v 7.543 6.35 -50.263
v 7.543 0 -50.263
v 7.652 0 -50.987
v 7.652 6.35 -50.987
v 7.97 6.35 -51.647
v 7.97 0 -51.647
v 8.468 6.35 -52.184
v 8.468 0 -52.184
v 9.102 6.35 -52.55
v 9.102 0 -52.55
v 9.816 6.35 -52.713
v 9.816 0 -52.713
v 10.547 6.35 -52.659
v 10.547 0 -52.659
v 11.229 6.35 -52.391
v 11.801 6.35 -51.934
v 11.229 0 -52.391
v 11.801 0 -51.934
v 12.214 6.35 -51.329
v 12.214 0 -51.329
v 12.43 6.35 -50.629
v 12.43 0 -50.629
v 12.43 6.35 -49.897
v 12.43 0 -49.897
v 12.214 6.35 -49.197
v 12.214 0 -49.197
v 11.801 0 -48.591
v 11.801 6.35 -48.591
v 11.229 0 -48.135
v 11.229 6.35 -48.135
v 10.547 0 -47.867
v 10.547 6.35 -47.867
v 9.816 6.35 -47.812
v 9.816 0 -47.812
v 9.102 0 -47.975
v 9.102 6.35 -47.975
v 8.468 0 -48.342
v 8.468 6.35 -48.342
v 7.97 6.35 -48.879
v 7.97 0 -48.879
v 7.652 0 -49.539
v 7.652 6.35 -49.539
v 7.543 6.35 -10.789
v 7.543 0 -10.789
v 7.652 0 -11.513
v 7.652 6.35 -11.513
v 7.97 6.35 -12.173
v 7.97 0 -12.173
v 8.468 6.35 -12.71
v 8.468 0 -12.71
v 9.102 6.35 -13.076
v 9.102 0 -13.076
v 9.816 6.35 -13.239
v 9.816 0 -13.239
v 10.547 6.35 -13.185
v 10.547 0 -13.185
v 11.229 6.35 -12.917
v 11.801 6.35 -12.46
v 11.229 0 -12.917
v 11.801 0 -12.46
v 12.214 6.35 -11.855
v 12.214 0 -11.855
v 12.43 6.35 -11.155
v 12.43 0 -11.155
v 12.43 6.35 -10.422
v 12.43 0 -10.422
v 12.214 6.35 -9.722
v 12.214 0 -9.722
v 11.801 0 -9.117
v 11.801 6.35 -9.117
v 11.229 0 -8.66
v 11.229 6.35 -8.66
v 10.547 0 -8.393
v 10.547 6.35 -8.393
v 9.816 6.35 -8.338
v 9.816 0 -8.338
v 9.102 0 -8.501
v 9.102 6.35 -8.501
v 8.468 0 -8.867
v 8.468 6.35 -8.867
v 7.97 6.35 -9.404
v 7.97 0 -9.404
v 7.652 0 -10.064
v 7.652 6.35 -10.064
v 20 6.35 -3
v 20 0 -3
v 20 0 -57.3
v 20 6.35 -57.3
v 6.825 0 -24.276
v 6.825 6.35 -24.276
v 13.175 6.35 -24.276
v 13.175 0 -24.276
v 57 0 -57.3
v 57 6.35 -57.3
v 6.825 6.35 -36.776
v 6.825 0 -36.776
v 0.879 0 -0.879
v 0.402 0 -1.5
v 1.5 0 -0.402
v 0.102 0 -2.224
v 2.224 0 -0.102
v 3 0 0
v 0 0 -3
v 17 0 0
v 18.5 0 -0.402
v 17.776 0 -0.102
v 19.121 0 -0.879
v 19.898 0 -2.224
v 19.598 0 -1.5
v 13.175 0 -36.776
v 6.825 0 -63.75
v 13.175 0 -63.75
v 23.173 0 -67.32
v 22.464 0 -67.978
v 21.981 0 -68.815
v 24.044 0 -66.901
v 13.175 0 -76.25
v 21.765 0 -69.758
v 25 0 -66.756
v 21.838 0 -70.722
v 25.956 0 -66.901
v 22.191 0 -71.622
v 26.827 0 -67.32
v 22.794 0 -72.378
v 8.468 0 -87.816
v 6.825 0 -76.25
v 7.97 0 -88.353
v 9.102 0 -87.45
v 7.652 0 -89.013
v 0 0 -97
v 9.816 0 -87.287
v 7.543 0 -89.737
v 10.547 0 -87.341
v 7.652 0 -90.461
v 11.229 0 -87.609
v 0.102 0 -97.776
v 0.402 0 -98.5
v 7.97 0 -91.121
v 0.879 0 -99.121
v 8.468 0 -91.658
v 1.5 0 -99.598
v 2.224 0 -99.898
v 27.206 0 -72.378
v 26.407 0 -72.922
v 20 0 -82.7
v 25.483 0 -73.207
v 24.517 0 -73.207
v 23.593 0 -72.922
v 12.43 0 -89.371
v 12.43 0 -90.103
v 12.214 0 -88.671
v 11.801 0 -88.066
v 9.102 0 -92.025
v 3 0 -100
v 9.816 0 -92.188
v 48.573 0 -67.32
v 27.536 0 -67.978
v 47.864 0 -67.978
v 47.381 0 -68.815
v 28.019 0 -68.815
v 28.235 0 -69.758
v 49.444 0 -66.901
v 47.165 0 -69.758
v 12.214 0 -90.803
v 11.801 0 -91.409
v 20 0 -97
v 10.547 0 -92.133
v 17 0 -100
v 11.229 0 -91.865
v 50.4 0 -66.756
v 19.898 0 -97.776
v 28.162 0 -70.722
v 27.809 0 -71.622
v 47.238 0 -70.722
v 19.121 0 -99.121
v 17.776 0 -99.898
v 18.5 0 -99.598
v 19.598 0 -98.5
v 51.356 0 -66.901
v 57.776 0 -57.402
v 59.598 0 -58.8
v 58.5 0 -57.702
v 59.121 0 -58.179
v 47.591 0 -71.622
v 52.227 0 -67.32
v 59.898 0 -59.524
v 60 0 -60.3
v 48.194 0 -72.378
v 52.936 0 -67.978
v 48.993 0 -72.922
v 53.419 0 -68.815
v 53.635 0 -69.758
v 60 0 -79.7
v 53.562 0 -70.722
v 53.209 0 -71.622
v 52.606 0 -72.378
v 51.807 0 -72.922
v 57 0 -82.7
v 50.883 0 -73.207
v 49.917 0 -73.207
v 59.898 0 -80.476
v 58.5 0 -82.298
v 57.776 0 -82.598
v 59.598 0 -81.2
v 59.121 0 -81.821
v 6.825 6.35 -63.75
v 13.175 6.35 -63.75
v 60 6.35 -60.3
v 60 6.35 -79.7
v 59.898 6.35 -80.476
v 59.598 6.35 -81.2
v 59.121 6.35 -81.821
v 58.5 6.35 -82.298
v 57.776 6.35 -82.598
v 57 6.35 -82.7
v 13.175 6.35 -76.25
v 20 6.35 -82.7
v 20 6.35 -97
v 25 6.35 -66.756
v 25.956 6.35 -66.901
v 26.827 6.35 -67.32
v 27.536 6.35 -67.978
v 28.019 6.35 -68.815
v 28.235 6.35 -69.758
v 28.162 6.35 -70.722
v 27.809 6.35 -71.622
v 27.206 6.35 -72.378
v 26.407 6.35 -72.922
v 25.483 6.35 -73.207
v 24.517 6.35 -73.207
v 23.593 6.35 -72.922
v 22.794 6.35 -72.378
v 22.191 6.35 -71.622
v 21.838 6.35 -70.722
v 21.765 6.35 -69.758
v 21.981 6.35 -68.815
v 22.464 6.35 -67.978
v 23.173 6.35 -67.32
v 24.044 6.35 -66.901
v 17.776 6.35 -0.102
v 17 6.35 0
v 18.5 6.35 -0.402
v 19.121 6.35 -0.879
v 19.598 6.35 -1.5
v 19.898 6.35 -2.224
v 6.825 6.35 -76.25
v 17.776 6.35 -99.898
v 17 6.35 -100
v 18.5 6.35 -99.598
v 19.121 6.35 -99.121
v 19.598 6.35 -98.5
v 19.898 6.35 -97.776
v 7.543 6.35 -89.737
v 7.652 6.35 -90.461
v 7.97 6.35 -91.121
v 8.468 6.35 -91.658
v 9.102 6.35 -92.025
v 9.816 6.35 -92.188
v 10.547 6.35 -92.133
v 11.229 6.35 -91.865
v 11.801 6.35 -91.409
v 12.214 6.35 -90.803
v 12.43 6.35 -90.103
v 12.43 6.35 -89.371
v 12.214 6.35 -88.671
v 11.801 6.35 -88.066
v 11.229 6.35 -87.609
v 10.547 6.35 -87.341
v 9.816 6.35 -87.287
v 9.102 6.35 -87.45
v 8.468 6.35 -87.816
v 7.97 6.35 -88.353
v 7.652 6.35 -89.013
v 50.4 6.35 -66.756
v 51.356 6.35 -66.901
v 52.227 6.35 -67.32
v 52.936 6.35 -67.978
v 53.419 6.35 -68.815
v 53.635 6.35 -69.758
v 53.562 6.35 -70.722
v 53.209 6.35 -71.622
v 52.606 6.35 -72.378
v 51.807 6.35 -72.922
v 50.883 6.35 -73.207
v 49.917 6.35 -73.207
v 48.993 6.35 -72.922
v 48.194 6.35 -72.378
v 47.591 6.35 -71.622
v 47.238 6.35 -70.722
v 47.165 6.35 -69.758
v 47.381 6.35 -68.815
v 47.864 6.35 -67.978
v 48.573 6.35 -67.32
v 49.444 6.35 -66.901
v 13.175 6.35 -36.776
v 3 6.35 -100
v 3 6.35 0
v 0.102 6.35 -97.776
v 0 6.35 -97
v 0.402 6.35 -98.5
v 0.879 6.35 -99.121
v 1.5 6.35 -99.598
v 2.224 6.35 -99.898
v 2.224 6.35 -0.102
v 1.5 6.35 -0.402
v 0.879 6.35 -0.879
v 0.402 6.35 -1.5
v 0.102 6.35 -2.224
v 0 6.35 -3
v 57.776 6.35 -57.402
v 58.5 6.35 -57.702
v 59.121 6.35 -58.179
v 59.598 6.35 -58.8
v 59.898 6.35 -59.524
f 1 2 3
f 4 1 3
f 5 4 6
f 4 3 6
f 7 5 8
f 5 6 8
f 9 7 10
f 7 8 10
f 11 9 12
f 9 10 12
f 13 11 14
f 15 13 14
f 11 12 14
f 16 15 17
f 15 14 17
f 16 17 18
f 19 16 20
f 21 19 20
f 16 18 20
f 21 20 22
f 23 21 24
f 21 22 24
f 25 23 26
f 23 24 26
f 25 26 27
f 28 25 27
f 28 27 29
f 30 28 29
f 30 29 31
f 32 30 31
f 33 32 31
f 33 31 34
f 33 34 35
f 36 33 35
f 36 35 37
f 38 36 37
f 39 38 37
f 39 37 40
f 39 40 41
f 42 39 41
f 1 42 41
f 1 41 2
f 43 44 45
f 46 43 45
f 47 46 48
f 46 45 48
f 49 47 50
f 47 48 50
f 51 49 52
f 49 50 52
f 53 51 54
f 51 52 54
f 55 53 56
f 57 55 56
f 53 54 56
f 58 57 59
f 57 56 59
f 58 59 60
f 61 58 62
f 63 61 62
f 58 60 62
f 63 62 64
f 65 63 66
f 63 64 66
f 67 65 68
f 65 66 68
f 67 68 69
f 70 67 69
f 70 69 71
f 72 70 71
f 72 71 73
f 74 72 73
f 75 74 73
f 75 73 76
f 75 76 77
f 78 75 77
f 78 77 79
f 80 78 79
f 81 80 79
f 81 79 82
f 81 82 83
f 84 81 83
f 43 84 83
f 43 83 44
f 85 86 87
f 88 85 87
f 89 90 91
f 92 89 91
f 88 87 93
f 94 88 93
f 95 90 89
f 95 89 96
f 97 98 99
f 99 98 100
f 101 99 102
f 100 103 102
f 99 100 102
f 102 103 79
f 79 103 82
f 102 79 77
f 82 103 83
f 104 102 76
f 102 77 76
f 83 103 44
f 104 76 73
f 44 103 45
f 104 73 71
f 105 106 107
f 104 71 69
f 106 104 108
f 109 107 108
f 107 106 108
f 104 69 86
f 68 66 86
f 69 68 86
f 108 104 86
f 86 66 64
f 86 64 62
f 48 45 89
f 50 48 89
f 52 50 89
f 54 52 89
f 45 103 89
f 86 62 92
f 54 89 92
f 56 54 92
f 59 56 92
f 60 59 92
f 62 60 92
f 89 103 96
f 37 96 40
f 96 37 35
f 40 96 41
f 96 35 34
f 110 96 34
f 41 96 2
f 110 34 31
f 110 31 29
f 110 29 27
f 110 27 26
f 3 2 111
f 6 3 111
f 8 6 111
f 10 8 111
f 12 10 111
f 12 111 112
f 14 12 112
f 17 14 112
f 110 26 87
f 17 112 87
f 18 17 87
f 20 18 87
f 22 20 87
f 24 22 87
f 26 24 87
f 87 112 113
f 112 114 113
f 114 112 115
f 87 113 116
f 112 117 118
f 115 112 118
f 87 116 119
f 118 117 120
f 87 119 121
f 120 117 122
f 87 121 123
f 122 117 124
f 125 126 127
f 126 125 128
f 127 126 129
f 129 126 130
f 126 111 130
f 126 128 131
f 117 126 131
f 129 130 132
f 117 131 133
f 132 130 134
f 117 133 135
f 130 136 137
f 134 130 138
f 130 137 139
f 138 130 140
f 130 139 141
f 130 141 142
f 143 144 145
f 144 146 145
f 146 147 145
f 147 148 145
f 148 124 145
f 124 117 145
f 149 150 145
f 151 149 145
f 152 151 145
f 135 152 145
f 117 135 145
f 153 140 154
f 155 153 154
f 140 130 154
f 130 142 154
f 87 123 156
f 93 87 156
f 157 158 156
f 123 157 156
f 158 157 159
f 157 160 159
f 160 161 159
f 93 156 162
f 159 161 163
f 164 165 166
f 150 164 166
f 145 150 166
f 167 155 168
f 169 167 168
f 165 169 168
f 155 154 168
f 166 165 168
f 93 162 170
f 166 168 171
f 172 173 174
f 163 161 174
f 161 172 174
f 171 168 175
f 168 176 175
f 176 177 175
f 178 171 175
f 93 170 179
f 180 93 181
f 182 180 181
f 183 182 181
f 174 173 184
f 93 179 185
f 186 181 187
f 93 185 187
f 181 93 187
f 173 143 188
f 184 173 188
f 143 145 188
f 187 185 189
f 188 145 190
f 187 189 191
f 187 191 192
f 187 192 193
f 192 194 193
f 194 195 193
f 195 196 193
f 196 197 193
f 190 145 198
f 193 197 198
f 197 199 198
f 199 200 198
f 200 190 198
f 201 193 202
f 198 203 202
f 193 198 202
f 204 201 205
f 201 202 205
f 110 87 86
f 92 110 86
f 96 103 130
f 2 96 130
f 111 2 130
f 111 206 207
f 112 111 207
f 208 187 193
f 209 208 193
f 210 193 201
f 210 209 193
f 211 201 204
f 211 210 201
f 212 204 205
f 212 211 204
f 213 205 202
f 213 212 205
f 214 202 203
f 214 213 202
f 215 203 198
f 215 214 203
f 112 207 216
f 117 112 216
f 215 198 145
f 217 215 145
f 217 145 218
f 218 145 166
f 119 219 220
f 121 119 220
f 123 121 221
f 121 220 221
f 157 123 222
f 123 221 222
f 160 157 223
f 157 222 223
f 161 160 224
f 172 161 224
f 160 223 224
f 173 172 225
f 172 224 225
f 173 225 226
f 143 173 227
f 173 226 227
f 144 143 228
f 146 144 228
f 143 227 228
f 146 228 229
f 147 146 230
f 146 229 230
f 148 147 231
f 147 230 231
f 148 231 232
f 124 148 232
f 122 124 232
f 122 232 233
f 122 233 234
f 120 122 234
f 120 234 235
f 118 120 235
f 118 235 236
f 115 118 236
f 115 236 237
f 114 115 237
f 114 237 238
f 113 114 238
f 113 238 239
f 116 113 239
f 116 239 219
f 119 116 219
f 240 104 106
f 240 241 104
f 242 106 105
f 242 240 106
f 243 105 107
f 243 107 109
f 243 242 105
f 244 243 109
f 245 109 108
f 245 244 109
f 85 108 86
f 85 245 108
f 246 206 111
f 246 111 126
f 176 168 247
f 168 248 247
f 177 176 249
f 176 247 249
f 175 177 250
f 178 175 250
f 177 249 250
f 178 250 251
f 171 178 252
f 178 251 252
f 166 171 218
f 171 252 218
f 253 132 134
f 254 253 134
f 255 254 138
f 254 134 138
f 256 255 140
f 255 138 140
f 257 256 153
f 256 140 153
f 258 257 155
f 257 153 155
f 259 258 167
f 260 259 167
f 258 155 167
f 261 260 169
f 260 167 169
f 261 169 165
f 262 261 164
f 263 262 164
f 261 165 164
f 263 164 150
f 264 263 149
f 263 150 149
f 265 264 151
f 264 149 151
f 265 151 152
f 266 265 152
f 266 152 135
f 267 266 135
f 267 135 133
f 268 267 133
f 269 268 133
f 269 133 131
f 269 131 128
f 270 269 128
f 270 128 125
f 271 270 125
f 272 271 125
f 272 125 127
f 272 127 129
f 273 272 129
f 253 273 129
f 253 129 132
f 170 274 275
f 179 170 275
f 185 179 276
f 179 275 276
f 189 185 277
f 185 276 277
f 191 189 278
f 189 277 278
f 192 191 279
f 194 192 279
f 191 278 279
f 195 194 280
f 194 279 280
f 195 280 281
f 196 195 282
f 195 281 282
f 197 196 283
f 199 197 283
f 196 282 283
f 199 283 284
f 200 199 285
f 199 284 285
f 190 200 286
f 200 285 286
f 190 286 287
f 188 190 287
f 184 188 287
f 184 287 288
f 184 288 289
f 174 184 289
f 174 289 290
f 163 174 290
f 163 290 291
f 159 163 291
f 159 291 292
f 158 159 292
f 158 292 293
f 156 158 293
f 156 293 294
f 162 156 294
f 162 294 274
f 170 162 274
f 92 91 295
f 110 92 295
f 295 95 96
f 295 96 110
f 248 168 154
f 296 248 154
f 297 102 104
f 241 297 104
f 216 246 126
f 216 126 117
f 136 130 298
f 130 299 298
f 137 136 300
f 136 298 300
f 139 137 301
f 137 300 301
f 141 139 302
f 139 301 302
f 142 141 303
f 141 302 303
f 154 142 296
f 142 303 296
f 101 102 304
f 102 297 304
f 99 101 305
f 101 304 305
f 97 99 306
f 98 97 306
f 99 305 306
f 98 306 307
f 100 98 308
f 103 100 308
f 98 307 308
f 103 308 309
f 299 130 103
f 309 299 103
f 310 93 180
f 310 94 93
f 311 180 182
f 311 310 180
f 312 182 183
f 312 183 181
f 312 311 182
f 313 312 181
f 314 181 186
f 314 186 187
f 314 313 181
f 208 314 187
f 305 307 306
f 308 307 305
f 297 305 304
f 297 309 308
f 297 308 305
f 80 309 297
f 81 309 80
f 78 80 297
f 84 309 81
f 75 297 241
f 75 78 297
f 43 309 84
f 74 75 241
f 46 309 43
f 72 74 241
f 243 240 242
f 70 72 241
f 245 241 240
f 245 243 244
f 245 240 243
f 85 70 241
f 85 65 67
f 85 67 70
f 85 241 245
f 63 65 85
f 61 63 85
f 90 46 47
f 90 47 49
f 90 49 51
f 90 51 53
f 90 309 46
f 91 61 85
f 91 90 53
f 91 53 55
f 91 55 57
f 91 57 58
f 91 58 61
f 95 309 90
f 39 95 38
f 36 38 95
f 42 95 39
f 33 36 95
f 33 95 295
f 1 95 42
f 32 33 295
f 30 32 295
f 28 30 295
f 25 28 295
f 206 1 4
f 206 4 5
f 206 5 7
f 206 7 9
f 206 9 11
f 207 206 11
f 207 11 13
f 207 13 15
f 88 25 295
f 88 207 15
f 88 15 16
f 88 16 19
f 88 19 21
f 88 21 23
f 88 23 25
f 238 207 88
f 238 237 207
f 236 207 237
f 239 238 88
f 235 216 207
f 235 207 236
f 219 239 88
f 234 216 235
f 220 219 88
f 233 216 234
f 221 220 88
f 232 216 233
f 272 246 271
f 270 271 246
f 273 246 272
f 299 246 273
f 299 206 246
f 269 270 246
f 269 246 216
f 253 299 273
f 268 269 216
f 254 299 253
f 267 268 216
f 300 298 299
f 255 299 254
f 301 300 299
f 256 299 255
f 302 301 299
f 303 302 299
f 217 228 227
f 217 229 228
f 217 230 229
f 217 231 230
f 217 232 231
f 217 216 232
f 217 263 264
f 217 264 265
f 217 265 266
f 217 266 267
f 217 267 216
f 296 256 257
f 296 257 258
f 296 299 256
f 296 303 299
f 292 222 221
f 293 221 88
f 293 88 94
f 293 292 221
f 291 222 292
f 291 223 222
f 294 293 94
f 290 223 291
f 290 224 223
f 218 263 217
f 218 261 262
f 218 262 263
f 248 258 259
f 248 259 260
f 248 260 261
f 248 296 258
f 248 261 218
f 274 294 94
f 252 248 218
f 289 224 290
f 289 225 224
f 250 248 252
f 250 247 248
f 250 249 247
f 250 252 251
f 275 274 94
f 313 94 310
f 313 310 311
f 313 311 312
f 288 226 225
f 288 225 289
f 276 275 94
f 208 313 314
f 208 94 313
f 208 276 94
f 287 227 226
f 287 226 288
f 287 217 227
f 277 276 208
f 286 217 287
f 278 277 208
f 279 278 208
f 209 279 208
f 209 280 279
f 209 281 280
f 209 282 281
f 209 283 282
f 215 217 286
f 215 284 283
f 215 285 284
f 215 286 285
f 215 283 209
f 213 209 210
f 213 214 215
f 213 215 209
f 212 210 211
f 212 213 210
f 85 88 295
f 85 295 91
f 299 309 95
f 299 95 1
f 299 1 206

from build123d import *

# Parameters (mm, degrees)
BOSS_EXTRUDE1_DEPTH          = 6.35
SKETCH2_W                    = 6.35
SKETCH2_H                    = 12.5
CUT_EXTRUDE1_DEPTH           = 117.791791236
F_10_0_1935_DIAMETER_HOLE2_D = 4.9149
SKETCH7_R                    = 3.24358
CUT_EXTRUDE2_DEPTH           = 117.791791236
FILLET1_R                    = 3


with BuildPart() as part:
    # Sketch1 → Boss-Extrude1 (new body)
    with BuildSketch(Plane(origin=(0, 0, 0), x_dir=(1, 0, 0), z_dir=(0, 1, 0))):
        Polygon((0, 0), (20, 0), (20, 57.3), (60, 57.3), (60, 82.7), (20, 82.7), (20, 100), (0, 100), align=None)
    extrude(amount=BOSS_EXTRUDE1_DEPTH)

    # Sketch2 → Cut-Extrude1 (cut, through all)
    with BuildSketch(Plane(origin=(0, 6.35, 0), x_dir=(1, 0, 0), z_dir=(0, 1, 0))):
        with Locations((10, 70)):
            Rectangle(SKETCH2_W, SKETCH2_H)
        with Locations((10, 30.5258)):
            Rectangle(SKETCH2_W, SKETCH2_H)
    extrude(amount=-CUT_EXTRUDE1_DEPTH, mode=Mode.SUBTRACT)

    # #10 (0.1935) Diameter Hole2 (through all)
    with Locations(Plane(origin=(0, 6.35, 0), x_dir=(1, 0, 0), z_dir=(0, 1, 0))):
        with Locations((10, 89.7371), (10, 50.2629), (10, 10.7887)):
            Hole(F_10_0_1935_DIAMETER_HOLE2_D / 2)

    # Sketch7 → Cut-Extrude2 (cut, through all)
    with BuildSketch(Plane(origin=(0, 6.35, 0), x_dir=(1, 0, 0), z_dir=(0, 1, 0))):
        with Locations(Location((25, 70, 0), (0, 0, 270))):
            Circle(SKETCH7_R)
        with Locations(Location((50.4, 70, 0), (0, 0, 270))):
            Circle(SKETCH7_R)
    extrude(amount=-CUT_EXTRUDE2_DEPTH, mode=Mode.SUBTRACT)

    # Fillet1
    fillet1_edges = [part.edges().sort_by_distance(p)[0] for p in [
        (0, 3.175, -100),
        (20, 3.175, -100),
        (60, 3.175, -82.7),
        (60, 3.175, -57.3),
        (20, 3.175, 0),
        (0, 3.175, 0),
    ]]
    fillet(fillet1_edges, radius=FILLET1_R)


solid = part.part
